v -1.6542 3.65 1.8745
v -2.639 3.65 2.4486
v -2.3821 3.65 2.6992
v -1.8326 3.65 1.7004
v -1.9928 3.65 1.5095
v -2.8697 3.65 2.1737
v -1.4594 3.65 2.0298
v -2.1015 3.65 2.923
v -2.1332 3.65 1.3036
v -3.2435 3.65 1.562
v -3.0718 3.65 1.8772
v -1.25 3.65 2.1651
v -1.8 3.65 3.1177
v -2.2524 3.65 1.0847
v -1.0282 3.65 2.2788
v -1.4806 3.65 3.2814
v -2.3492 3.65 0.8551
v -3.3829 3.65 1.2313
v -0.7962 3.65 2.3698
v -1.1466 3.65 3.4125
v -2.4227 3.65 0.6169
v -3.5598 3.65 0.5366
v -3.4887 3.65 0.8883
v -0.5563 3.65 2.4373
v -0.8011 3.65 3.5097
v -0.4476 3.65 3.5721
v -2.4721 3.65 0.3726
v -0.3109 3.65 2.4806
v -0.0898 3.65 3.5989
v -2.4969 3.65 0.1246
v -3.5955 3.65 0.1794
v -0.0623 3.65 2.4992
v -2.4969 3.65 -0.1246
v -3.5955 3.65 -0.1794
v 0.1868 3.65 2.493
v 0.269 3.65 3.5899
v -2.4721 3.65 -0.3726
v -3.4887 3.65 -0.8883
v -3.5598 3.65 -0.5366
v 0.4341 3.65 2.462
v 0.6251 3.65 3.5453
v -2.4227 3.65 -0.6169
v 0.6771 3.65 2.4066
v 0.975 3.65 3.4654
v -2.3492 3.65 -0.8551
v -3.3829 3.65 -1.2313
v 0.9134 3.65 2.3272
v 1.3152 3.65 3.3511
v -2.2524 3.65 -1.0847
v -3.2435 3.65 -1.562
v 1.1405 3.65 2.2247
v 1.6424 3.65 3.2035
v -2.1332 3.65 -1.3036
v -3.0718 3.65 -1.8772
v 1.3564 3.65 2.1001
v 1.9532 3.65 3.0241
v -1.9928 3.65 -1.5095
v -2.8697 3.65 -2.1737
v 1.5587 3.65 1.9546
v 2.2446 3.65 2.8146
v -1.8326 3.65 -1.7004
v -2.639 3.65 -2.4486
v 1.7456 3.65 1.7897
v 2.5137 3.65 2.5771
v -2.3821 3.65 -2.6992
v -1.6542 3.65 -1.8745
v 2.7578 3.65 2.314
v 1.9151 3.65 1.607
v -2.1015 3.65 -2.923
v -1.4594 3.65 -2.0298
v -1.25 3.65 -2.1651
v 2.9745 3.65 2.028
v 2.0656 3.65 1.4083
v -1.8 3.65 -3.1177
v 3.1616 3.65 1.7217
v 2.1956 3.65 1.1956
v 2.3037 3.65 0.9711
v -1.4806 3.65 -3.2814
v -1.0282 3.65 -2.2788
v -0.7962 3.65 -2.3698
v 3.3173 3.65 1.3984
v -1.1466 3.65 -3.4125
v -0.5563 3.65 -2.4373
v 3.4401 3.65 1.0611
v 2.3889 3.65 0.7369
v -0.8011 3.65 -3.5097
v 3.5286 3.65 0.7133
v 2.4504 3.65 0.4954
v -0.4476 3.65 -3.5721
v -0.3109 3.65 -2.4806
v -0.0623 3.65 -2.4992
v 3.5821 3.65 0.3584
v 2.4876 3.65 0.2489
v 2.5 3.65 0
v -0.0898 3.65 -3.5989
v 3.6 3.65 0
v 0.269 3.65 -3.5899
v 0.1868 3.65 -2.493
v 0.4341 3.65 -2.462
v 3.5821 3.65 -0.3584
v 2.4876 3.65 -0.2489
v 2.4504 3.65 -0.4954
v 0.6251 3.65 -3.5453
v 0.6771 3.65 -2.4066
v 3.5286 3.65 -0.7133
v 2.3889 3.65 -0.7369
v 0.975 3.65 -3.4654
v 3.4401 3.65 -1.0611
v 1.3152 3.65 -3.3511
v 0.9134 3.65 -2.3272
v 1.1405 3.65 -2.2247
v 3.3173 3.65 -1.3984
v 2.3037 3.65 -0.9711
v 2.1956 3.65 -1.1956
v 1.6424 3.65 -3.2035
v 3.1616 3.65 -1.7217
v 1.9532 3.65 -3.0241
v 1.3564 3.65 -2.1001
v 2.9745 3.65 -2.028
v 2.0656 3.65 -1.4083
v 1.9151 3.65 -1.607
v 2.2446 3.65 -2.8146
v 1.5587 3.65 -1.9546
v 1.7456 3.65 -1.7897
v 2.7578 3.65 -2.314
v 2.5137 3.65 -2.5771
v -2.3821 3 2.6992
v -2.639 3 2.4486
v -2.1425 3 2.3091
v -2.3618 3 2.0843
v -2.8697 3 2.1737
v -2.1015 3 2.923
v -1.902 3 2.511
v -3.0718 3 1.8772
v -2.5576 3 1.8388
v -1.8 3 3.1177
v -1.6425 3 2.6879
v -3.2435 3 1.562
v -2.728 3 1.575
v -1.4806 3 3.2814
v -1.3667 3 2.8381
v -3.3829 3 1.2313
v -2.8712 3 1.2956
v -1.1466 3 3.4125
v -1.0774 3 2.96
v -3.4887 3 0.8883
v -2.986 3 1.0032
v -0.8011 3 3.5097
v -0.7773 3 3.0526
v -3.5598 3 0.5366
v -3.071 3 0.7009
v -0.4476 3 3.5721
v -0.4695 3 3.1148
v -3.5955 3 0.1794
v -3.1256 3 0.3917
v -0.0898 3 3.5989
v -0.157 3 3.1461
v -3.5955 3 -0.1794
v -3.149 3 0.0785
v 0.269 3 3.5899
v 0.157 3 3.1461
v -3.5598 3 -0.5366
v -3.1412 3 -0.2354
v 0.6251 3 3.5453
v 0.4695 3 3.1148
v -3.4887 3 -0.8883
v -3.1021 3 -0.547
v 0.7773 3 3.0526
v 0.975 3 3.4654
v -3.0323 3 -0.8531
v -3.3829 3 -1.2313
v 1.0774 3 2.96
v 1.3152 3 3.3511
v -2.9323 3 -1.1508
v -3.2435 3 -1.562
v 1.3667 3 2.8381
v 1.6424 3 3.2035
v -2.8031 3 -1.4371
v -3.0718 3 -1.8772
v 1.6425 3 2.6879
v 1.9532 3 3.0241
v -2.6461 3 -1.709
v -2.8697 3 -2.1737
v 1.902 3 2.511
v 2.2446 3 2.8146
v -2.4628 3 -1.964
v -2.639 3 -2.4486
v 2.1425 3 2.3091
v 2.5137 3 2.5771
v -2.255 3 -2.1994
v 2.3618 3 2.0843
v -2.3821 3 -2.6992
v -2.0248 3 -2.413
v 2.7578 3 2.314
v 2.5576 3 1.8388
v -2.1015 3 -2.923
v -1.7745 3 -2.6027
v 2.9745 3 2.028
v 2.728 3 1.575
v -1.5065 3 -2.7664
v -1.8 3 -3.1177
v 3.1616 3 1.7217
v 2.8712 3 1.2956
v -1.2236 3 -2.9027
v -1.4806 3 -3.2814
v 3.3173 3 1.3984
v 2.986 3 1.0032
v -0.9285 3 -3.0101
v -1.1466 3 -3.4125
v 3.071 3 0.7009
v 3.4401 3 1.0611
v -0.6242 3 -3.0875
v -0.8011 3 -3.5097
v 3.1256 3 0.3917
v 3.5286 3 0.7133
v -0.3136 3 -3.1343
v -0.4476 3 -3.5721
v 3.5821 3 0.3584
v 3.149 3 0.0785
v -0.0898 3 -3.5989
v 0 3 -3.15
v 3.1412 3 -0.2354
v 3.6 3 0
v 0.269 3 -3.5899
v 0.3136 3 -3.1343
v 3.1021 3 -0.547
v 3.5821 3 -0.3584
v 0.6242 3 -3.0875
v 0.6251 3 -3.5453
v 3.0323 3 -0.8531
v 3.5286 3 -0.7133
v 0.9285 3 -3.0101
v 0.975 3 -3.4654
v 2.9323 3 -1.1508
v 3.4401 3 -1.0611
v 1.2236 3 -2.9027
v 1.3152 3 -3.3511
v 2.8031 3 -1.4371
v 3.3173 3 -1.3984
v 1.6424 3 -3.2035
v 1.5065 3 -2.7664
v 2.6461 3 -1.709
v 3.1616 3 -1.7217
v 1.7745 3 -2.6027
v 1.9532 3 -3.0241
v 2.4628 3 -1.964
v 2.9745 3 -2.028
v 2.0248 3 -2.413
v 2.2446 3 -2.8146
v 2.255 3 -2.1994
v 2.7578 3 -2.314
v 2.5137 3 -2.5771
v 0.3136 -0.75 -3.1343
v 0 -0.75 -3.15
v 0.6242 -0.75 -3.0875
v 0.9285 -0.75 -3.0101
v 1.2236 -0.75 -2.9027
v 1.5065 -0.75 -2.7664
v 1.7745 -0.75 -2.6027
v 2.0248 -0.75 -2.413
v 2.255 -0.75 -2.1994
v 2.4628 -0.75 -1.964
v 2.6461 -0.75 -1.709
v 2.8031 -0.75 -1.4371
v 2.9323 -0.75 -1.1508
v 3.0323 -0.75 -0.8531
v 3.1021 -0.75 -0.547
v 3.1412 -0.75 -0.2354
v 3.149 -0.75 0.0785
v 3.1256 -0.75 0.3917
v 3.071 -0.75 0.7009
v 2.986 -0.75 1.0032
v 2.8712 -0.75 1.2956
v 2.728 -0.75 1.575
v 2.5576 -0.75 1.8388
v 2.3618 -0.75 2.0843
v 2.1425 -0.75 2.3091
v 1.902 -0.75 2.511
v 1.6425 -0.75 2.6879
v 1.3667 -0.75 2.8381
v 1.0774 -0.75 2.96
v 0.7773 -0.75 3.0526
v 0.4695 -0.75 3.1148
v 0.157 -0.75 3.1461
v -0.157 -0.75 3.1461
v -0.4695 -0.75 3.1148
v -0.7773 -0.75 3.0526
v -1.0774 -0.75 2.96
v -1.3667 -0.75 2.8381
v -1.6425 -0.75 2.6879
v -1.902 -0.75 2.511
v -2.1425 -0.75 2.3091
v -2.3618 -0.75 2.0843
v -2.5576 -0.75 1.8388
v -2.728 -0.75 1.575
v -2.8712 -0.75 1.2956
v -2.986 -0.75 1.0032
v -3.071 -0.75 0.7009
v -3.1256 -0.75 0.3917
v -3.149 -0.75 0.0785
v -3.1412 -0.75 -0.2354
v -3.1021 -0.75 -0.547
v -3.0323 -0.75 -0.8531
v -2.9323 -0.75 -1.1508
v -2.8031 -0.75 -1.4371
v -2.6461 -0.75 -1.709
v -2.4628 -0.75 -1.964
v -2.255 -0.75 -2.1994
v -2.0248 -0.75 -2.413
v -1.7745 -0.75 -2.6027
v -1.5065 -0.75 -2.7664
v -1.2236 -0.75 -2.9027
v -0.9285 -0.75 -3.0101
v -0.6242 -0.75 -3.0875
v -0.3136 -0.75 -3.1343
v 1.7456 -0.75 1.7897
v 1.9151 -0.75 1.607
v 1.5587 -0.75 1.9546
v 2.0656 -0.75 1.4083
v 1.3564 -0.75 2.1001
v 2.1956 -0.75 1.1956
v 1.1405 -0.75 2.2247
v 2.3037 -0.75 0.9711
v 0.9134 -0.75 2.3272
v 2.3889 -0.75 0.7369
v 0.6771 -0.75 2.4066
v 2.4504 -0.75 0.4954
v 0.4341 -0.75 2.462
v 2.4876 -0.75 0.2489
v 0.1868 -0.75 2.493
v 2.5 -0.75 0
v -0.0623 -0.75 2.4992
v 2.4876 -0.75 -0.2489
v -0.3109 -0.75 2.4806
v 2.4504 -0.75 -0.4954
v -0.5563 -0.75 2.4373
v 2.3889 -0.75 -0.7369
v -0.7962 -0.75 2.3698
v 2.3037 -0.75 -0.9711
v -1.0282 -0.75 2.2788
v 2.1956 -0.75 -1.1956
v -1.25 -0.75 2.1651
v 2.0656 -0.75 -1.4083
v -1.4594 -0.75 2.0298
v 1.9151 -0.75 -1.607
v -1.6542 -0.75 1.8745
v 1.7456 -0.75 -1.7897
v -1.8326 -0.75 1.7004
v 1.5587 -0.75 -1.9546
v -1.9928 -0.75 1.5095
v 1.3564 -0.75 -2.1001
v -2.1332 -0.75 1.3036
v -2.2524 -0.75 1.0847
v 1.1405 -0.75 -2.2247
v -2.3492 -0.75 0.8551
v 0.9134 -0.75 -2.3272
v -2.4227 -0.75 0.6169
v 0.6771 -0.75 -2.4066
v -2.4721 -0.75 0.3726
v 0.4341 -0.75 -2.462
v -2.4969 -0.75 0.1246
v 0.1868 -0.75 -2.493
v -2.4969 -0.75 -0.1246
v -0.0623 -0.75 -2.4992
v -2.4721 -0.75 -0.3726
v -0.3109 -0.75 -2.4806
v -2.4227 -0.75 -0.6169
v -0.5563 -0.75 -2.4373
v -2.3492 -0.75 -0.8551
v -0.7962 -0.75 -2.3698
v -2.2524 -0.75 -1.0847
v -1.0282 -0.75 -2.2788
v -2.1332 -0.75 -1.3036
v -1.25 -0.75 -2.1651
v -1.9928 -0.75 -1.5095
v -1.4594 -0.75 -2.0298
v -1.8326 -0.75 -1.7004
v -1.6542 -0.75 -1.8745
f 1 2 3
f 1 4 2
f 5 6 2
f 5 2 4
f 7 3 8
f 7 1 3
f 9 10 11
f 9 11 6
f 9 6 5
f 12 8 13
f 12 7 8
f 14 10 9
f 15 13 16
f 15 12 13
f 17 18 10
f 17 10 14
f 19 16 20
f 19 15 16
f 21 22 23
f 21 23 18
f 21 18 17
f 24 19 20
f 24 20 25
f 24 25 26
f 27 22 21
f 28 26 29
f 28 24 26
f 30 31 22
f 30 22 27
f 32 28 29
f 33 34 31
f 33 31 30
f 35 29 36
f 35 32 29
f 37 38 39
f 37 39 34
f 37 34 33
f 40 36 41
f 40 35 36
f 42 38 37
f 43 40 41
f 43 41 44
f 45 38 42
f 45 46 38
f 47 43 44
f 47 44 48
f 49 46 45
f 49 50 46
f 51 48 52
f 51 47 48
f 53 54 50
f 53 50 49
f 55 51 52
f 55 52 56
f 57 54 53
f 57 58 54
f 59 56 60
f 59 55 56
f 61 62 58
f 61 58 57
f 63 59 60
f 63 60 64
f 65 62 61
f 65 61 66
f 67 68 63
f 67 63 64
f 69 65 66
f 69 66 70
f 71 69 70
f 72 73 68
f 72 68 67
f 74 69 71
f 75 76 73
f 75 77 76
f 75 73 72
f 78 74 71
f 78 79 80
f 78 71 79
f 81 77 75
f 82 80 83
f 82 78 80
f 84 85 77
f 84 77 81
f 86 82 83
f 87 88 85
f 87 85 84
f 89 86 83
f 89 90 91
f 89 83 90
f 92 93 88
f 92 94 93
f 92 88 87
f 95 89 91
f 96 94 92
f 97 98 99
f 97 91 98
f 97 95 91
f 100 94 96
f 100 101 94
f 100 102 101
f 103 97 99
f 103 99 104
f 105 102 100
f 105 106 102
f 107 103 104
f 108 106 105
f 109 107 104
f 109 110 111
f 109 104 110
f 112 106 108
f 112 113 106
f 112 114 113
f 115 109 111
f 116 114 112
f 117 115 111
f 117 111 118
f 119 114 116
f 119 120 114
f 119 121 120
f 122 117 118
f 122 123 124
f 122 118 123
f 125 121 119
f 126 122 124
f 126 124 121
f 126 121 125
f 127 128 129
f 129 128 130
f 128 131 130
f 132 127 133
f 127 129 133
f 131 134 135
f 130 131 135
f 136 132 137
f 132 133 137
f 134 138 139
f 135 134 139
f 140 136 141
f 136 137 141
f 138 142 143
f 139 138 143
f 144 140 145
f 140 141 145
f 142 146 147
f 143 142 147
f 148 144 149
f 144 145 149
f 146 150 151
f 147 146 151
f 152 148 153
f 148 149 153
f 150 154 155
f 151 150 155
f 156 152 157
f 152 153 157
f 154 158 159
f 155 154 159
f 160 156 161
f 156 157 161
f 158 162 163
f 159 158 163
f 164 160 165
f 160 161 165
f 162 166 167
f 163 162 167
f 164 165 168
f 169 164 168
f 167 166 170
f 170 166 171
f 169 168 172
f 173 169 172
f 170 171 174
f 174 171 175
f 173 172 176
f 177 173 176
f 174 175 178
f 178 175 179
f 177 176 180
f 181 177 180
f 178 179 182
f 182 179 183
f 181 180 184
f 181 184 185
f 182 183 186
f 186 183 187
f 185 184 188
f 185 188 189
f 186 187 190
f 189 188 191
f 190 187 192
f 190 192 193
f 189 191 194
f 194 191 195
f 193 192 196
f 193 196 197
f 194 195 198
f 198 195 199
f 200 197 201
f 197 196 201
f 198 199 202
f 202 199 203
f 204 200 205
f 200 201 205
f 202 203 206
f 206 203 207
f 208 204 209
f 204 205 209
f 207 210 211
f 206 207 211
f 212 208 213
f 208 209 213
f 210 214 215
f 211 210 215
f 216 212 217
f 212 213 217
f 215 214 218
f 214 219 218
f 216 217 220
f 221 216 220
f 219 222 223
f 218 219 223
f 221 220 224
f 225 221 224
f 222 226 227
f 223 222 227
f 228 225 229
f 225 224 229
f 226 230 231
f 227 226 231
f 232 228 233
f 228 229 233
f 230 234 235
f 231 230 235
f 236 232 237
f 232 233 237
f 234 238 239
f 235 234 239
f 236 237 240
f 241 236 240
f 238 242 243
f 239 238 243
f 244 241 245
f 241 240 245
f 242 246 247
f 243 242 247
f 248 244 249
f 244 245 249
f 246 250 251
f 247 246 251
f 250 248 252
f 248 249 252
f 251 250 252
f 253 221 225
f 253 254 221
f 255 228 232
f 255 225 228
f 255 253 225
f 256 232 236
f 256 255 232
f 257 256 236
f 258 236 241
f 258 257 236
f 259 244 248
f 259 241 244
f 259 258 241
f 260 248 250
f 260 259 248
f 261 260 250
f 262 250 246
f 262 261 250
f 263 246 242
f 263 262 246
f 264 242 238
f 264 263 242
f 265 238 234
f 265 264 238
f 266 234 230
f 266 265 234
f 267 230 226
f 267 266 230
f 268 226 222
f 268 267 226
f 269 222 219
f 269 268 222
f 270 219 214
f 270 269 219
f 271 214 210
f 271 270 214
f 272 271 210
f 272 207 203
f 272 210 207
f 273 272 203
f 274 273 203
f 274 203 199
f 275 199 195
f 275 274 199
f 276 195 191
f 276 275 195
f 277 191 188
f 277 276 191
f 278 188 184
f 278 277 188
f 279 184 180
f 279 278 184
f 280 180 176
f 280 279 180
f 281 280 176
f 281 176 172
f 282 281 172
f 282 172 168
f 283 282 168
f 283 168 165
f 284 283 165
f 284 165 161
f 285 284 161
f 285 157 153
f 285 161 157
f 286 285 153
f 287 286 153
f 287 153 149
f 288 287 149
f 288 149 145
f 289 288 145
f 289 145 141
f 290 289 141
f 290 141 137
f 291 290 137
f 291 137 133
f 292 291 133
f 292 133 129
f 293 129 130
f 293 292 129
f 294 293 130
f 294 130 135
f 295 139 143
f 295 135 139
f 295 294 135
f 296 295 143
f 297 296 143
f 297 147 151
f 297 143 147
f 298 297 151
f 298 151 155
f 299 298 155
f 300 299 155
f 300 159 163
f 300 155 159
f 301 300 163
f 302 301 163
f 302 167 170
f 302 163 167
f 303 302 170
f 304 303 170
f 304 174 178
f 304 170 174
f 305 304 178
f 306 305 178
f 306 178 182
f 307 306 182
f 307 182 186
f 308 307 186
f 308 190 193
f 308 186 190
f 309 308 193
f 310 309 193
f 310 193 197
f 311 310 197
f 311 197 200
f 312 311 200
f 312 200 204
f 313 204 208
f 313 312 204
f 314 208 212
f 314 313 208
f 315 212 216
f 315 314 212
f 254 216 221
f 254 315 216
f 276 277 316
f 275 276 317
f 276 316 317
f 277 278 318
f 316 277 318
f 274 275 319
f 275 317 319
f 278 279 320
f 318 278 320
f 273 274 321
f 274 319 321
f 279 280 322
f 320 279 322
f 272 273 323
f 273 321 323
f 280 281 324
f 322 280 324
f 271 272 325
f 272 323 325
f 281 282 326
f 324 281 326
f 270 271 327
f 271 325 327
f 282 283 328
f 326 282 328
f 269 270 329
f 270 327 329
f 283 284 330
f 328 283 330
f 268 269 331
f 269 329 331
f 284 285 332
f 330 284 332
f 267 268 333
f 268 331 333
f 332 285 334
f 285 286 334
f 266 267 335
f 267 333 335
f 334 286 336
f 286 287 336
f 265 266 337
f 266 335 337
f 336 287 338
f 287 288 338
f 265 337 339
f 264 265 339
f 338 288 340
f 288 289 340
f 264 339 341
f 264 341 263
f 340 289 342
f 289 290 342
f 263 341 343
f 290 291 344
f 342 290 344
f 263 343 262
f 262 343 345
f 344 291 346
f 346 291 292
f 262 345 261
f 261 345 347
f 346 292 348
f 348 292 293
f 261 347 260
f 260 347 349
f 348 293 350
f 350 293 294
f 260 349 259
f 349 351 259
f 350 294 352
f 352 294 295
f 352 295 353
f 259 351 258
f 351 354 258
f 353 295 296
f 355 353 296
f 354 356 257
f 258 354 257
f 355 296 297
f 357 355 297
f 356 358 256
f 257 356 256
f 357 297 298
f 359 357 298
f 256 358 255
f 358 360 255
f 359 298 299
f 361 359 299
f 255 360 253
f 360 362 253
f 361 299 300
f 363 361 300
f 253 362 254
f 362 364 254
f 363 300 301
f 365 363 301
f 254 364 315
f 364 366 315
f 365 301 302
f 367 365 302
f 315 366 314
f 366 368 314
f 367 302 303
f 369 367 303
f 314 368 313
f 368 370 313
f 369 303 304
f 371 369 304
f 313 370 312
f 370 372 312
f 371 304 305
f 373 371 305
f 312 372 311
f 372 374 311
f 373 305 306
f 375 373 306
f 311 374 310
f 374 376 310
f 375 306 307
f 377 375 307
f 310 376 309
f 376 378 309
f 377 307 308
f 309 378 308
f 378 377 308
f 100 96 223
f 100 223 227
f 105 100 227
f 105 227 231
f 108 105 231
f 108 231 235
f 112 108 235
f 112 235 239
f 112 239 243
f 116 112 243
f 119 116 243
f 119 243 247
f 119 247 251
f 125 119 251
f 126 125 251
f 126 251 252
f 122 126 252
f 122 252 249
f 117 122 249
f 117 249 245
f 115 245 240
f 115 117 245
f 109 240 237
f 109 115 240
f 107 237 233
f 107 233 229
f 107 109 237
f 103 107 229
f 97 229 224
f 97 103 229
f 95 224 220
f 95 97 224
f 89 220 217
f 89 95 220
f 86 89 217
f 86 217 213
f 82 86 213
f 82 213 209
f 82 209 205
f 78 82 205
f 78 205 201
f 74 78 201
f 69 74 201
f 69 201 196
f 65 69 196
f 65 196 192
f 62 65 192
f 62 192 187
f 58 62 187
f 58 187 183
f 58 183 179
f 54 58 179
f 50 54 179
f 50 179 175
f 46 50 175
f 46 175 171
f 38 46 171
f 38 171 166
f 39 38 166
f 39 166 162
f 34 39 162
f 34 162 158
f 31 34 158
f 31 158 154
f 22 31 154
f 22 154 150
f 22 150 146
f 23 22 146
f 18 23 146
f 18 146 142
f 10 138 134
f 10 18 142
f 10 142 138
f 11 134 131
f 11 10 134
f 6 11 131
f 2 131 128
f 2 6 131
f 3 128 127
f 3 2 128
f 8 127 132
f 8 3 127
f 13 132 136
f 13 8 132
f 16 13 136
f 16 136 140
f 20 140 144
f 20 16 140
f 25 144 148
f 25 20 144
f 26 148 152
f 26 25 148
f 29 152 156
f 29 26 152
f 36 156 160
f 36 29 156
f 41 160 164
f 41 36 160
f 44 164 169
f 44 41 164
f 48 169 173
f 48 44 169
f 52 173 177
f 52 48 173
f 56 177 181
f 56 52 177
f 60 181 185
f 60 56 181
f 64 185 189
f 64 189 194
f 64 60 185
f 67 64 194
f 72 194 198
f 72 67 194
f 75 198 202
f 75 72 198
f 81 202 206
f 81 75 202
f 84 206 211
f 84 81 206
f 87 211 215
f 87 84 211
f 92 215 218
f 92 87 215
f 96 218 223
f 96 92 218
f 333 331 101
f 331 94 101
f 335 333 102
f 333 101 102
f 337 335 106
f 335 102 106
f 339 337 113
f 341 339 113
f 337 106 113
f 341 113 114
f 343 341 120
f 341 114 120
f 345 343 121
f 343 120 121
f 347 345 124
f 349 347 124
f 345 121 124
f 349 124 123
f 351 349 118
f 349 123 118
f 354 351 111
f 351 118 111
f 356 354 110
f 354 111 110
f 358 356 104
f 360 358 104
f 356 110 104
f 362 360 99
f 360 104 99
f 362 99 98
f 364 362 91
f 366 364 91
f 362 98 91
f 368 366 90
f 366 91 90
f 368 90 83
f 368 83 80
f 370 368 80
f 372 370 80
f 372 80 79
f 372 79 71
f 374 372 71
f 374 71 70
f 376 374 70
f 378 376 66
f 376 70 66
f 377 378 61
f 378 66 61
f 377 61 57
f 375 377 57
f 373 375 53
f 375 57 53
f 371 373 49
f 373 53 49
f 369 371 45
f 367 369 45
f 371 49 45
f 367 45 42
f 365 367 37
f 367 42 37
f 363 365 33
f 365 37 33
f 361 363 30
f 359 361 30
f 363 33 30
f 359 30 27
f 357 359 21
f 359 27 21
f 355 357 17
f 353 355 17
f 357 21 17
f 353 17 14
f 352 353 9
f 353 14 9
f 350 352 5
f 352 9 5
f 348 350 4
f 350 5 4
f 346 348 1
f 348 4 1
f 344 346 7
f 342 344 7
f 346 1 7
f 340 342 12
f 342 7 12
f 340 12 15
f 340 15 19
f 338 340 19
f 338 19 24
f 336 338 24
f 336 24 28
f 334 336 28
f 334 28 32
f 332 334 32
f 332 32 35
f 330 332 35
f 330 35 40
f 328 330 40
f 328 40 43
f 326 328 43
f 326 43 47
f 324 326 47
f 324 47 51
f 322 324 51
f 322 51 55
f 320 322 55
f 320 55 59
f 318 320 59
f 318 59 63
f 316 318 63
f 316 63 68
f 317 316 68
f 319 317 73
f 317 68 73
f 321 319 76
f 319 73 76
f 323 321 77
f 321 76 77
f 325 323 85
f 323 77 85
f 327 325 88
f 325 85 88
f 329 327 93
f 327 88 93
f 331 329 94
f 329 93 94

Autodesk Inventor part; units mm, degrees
ref_plane "YZ Plane" through (0, 0, 0) normal (1, 0, 0) x (0, 1, 0)
ref_plane "XZ Plane" through (0, 0, 0) normal (0, 1, 0) x (-1, 0, 0)
ref_plane "XY Plane" through (0, 0, 0) normal (0, 0, 1) x (1, 0, 0)
sketch "Sketch1" plane through (0, 0, 0) normal (0, 0, 1) x (1, 0, 0)
  line L0 (0, 0) -> (1.65, 0)
  line L1 (1.65, 0) -> (1.65, 3)
  line L2 (1.65, 3) -> (3.6, 3)
  line L3 (3.6, 3) -> (3.6, 3.65)
  line L4 (3.6, 3.65) -> (1.65, 3.65)
  line L5 (0, 0) -> (0, 3.65)
  line L6 (1.65, 3.65) -> (0, 3.65)
  dimension "d0" = 1.65
  dimension "d1" = 1.95
  dimension "d2" = 3
  dimension "d3" = 0.65
revolve "Revolution1" add sketch "Sketch1" angle 360 about axis through (0, 0, 0) along (0, 1, 0)
sketch "Sketch2" plane through (0, 0, 0) normal (1, 0, 0) x (0, 1, 0)
  line L0 (3, 1.65) -> (3, -1.65) projected
  line L1 (0, 1.65) -> (0, -1.65) projected
  line L2 (3.65, 3.6) -> (3.65, -3.6) projected
  line L3 (3, 3.6) -> (3, -3.6) projected
  line L4 (3, -1.65) -> (0, -1.65) projected
  line L5 (3, 1.65) -> (0, 1.65) projected
  line L6 (3, -3.15) -> (-0.75, -3.15)
  line L7 (-0.75, -3.15) -> (-0.75, -1.65)
  line L8 (-0.75, -1.65) -> (3, -1.65)
  line L9 (3, -1.65) -> (3, -3.15)
  line L10 (0, 0) -> (11.9884, 0)
  dimension "d5" = 3.75
  dimension "d6" = 1.5
  dimension "d12" = 3.15
sketch "Sketch3" plane through (0, 3.65, 0) normal (0, 1, 0) x (1, 0, 0)
  circle A0 centre (0, 0) radius 2.5
  dimension "d7" = 5
revolve "Revolution2" add sketch "Sketch2" angle 360 about axis through (0, 0, 0) along (0, 1, 0) contours L3 L6 L7 L8 L4
extrude "Extrusion1" cut sketch "Sketch3" against normal through all
properties part number "LED holder" material "ABS Plastic"
